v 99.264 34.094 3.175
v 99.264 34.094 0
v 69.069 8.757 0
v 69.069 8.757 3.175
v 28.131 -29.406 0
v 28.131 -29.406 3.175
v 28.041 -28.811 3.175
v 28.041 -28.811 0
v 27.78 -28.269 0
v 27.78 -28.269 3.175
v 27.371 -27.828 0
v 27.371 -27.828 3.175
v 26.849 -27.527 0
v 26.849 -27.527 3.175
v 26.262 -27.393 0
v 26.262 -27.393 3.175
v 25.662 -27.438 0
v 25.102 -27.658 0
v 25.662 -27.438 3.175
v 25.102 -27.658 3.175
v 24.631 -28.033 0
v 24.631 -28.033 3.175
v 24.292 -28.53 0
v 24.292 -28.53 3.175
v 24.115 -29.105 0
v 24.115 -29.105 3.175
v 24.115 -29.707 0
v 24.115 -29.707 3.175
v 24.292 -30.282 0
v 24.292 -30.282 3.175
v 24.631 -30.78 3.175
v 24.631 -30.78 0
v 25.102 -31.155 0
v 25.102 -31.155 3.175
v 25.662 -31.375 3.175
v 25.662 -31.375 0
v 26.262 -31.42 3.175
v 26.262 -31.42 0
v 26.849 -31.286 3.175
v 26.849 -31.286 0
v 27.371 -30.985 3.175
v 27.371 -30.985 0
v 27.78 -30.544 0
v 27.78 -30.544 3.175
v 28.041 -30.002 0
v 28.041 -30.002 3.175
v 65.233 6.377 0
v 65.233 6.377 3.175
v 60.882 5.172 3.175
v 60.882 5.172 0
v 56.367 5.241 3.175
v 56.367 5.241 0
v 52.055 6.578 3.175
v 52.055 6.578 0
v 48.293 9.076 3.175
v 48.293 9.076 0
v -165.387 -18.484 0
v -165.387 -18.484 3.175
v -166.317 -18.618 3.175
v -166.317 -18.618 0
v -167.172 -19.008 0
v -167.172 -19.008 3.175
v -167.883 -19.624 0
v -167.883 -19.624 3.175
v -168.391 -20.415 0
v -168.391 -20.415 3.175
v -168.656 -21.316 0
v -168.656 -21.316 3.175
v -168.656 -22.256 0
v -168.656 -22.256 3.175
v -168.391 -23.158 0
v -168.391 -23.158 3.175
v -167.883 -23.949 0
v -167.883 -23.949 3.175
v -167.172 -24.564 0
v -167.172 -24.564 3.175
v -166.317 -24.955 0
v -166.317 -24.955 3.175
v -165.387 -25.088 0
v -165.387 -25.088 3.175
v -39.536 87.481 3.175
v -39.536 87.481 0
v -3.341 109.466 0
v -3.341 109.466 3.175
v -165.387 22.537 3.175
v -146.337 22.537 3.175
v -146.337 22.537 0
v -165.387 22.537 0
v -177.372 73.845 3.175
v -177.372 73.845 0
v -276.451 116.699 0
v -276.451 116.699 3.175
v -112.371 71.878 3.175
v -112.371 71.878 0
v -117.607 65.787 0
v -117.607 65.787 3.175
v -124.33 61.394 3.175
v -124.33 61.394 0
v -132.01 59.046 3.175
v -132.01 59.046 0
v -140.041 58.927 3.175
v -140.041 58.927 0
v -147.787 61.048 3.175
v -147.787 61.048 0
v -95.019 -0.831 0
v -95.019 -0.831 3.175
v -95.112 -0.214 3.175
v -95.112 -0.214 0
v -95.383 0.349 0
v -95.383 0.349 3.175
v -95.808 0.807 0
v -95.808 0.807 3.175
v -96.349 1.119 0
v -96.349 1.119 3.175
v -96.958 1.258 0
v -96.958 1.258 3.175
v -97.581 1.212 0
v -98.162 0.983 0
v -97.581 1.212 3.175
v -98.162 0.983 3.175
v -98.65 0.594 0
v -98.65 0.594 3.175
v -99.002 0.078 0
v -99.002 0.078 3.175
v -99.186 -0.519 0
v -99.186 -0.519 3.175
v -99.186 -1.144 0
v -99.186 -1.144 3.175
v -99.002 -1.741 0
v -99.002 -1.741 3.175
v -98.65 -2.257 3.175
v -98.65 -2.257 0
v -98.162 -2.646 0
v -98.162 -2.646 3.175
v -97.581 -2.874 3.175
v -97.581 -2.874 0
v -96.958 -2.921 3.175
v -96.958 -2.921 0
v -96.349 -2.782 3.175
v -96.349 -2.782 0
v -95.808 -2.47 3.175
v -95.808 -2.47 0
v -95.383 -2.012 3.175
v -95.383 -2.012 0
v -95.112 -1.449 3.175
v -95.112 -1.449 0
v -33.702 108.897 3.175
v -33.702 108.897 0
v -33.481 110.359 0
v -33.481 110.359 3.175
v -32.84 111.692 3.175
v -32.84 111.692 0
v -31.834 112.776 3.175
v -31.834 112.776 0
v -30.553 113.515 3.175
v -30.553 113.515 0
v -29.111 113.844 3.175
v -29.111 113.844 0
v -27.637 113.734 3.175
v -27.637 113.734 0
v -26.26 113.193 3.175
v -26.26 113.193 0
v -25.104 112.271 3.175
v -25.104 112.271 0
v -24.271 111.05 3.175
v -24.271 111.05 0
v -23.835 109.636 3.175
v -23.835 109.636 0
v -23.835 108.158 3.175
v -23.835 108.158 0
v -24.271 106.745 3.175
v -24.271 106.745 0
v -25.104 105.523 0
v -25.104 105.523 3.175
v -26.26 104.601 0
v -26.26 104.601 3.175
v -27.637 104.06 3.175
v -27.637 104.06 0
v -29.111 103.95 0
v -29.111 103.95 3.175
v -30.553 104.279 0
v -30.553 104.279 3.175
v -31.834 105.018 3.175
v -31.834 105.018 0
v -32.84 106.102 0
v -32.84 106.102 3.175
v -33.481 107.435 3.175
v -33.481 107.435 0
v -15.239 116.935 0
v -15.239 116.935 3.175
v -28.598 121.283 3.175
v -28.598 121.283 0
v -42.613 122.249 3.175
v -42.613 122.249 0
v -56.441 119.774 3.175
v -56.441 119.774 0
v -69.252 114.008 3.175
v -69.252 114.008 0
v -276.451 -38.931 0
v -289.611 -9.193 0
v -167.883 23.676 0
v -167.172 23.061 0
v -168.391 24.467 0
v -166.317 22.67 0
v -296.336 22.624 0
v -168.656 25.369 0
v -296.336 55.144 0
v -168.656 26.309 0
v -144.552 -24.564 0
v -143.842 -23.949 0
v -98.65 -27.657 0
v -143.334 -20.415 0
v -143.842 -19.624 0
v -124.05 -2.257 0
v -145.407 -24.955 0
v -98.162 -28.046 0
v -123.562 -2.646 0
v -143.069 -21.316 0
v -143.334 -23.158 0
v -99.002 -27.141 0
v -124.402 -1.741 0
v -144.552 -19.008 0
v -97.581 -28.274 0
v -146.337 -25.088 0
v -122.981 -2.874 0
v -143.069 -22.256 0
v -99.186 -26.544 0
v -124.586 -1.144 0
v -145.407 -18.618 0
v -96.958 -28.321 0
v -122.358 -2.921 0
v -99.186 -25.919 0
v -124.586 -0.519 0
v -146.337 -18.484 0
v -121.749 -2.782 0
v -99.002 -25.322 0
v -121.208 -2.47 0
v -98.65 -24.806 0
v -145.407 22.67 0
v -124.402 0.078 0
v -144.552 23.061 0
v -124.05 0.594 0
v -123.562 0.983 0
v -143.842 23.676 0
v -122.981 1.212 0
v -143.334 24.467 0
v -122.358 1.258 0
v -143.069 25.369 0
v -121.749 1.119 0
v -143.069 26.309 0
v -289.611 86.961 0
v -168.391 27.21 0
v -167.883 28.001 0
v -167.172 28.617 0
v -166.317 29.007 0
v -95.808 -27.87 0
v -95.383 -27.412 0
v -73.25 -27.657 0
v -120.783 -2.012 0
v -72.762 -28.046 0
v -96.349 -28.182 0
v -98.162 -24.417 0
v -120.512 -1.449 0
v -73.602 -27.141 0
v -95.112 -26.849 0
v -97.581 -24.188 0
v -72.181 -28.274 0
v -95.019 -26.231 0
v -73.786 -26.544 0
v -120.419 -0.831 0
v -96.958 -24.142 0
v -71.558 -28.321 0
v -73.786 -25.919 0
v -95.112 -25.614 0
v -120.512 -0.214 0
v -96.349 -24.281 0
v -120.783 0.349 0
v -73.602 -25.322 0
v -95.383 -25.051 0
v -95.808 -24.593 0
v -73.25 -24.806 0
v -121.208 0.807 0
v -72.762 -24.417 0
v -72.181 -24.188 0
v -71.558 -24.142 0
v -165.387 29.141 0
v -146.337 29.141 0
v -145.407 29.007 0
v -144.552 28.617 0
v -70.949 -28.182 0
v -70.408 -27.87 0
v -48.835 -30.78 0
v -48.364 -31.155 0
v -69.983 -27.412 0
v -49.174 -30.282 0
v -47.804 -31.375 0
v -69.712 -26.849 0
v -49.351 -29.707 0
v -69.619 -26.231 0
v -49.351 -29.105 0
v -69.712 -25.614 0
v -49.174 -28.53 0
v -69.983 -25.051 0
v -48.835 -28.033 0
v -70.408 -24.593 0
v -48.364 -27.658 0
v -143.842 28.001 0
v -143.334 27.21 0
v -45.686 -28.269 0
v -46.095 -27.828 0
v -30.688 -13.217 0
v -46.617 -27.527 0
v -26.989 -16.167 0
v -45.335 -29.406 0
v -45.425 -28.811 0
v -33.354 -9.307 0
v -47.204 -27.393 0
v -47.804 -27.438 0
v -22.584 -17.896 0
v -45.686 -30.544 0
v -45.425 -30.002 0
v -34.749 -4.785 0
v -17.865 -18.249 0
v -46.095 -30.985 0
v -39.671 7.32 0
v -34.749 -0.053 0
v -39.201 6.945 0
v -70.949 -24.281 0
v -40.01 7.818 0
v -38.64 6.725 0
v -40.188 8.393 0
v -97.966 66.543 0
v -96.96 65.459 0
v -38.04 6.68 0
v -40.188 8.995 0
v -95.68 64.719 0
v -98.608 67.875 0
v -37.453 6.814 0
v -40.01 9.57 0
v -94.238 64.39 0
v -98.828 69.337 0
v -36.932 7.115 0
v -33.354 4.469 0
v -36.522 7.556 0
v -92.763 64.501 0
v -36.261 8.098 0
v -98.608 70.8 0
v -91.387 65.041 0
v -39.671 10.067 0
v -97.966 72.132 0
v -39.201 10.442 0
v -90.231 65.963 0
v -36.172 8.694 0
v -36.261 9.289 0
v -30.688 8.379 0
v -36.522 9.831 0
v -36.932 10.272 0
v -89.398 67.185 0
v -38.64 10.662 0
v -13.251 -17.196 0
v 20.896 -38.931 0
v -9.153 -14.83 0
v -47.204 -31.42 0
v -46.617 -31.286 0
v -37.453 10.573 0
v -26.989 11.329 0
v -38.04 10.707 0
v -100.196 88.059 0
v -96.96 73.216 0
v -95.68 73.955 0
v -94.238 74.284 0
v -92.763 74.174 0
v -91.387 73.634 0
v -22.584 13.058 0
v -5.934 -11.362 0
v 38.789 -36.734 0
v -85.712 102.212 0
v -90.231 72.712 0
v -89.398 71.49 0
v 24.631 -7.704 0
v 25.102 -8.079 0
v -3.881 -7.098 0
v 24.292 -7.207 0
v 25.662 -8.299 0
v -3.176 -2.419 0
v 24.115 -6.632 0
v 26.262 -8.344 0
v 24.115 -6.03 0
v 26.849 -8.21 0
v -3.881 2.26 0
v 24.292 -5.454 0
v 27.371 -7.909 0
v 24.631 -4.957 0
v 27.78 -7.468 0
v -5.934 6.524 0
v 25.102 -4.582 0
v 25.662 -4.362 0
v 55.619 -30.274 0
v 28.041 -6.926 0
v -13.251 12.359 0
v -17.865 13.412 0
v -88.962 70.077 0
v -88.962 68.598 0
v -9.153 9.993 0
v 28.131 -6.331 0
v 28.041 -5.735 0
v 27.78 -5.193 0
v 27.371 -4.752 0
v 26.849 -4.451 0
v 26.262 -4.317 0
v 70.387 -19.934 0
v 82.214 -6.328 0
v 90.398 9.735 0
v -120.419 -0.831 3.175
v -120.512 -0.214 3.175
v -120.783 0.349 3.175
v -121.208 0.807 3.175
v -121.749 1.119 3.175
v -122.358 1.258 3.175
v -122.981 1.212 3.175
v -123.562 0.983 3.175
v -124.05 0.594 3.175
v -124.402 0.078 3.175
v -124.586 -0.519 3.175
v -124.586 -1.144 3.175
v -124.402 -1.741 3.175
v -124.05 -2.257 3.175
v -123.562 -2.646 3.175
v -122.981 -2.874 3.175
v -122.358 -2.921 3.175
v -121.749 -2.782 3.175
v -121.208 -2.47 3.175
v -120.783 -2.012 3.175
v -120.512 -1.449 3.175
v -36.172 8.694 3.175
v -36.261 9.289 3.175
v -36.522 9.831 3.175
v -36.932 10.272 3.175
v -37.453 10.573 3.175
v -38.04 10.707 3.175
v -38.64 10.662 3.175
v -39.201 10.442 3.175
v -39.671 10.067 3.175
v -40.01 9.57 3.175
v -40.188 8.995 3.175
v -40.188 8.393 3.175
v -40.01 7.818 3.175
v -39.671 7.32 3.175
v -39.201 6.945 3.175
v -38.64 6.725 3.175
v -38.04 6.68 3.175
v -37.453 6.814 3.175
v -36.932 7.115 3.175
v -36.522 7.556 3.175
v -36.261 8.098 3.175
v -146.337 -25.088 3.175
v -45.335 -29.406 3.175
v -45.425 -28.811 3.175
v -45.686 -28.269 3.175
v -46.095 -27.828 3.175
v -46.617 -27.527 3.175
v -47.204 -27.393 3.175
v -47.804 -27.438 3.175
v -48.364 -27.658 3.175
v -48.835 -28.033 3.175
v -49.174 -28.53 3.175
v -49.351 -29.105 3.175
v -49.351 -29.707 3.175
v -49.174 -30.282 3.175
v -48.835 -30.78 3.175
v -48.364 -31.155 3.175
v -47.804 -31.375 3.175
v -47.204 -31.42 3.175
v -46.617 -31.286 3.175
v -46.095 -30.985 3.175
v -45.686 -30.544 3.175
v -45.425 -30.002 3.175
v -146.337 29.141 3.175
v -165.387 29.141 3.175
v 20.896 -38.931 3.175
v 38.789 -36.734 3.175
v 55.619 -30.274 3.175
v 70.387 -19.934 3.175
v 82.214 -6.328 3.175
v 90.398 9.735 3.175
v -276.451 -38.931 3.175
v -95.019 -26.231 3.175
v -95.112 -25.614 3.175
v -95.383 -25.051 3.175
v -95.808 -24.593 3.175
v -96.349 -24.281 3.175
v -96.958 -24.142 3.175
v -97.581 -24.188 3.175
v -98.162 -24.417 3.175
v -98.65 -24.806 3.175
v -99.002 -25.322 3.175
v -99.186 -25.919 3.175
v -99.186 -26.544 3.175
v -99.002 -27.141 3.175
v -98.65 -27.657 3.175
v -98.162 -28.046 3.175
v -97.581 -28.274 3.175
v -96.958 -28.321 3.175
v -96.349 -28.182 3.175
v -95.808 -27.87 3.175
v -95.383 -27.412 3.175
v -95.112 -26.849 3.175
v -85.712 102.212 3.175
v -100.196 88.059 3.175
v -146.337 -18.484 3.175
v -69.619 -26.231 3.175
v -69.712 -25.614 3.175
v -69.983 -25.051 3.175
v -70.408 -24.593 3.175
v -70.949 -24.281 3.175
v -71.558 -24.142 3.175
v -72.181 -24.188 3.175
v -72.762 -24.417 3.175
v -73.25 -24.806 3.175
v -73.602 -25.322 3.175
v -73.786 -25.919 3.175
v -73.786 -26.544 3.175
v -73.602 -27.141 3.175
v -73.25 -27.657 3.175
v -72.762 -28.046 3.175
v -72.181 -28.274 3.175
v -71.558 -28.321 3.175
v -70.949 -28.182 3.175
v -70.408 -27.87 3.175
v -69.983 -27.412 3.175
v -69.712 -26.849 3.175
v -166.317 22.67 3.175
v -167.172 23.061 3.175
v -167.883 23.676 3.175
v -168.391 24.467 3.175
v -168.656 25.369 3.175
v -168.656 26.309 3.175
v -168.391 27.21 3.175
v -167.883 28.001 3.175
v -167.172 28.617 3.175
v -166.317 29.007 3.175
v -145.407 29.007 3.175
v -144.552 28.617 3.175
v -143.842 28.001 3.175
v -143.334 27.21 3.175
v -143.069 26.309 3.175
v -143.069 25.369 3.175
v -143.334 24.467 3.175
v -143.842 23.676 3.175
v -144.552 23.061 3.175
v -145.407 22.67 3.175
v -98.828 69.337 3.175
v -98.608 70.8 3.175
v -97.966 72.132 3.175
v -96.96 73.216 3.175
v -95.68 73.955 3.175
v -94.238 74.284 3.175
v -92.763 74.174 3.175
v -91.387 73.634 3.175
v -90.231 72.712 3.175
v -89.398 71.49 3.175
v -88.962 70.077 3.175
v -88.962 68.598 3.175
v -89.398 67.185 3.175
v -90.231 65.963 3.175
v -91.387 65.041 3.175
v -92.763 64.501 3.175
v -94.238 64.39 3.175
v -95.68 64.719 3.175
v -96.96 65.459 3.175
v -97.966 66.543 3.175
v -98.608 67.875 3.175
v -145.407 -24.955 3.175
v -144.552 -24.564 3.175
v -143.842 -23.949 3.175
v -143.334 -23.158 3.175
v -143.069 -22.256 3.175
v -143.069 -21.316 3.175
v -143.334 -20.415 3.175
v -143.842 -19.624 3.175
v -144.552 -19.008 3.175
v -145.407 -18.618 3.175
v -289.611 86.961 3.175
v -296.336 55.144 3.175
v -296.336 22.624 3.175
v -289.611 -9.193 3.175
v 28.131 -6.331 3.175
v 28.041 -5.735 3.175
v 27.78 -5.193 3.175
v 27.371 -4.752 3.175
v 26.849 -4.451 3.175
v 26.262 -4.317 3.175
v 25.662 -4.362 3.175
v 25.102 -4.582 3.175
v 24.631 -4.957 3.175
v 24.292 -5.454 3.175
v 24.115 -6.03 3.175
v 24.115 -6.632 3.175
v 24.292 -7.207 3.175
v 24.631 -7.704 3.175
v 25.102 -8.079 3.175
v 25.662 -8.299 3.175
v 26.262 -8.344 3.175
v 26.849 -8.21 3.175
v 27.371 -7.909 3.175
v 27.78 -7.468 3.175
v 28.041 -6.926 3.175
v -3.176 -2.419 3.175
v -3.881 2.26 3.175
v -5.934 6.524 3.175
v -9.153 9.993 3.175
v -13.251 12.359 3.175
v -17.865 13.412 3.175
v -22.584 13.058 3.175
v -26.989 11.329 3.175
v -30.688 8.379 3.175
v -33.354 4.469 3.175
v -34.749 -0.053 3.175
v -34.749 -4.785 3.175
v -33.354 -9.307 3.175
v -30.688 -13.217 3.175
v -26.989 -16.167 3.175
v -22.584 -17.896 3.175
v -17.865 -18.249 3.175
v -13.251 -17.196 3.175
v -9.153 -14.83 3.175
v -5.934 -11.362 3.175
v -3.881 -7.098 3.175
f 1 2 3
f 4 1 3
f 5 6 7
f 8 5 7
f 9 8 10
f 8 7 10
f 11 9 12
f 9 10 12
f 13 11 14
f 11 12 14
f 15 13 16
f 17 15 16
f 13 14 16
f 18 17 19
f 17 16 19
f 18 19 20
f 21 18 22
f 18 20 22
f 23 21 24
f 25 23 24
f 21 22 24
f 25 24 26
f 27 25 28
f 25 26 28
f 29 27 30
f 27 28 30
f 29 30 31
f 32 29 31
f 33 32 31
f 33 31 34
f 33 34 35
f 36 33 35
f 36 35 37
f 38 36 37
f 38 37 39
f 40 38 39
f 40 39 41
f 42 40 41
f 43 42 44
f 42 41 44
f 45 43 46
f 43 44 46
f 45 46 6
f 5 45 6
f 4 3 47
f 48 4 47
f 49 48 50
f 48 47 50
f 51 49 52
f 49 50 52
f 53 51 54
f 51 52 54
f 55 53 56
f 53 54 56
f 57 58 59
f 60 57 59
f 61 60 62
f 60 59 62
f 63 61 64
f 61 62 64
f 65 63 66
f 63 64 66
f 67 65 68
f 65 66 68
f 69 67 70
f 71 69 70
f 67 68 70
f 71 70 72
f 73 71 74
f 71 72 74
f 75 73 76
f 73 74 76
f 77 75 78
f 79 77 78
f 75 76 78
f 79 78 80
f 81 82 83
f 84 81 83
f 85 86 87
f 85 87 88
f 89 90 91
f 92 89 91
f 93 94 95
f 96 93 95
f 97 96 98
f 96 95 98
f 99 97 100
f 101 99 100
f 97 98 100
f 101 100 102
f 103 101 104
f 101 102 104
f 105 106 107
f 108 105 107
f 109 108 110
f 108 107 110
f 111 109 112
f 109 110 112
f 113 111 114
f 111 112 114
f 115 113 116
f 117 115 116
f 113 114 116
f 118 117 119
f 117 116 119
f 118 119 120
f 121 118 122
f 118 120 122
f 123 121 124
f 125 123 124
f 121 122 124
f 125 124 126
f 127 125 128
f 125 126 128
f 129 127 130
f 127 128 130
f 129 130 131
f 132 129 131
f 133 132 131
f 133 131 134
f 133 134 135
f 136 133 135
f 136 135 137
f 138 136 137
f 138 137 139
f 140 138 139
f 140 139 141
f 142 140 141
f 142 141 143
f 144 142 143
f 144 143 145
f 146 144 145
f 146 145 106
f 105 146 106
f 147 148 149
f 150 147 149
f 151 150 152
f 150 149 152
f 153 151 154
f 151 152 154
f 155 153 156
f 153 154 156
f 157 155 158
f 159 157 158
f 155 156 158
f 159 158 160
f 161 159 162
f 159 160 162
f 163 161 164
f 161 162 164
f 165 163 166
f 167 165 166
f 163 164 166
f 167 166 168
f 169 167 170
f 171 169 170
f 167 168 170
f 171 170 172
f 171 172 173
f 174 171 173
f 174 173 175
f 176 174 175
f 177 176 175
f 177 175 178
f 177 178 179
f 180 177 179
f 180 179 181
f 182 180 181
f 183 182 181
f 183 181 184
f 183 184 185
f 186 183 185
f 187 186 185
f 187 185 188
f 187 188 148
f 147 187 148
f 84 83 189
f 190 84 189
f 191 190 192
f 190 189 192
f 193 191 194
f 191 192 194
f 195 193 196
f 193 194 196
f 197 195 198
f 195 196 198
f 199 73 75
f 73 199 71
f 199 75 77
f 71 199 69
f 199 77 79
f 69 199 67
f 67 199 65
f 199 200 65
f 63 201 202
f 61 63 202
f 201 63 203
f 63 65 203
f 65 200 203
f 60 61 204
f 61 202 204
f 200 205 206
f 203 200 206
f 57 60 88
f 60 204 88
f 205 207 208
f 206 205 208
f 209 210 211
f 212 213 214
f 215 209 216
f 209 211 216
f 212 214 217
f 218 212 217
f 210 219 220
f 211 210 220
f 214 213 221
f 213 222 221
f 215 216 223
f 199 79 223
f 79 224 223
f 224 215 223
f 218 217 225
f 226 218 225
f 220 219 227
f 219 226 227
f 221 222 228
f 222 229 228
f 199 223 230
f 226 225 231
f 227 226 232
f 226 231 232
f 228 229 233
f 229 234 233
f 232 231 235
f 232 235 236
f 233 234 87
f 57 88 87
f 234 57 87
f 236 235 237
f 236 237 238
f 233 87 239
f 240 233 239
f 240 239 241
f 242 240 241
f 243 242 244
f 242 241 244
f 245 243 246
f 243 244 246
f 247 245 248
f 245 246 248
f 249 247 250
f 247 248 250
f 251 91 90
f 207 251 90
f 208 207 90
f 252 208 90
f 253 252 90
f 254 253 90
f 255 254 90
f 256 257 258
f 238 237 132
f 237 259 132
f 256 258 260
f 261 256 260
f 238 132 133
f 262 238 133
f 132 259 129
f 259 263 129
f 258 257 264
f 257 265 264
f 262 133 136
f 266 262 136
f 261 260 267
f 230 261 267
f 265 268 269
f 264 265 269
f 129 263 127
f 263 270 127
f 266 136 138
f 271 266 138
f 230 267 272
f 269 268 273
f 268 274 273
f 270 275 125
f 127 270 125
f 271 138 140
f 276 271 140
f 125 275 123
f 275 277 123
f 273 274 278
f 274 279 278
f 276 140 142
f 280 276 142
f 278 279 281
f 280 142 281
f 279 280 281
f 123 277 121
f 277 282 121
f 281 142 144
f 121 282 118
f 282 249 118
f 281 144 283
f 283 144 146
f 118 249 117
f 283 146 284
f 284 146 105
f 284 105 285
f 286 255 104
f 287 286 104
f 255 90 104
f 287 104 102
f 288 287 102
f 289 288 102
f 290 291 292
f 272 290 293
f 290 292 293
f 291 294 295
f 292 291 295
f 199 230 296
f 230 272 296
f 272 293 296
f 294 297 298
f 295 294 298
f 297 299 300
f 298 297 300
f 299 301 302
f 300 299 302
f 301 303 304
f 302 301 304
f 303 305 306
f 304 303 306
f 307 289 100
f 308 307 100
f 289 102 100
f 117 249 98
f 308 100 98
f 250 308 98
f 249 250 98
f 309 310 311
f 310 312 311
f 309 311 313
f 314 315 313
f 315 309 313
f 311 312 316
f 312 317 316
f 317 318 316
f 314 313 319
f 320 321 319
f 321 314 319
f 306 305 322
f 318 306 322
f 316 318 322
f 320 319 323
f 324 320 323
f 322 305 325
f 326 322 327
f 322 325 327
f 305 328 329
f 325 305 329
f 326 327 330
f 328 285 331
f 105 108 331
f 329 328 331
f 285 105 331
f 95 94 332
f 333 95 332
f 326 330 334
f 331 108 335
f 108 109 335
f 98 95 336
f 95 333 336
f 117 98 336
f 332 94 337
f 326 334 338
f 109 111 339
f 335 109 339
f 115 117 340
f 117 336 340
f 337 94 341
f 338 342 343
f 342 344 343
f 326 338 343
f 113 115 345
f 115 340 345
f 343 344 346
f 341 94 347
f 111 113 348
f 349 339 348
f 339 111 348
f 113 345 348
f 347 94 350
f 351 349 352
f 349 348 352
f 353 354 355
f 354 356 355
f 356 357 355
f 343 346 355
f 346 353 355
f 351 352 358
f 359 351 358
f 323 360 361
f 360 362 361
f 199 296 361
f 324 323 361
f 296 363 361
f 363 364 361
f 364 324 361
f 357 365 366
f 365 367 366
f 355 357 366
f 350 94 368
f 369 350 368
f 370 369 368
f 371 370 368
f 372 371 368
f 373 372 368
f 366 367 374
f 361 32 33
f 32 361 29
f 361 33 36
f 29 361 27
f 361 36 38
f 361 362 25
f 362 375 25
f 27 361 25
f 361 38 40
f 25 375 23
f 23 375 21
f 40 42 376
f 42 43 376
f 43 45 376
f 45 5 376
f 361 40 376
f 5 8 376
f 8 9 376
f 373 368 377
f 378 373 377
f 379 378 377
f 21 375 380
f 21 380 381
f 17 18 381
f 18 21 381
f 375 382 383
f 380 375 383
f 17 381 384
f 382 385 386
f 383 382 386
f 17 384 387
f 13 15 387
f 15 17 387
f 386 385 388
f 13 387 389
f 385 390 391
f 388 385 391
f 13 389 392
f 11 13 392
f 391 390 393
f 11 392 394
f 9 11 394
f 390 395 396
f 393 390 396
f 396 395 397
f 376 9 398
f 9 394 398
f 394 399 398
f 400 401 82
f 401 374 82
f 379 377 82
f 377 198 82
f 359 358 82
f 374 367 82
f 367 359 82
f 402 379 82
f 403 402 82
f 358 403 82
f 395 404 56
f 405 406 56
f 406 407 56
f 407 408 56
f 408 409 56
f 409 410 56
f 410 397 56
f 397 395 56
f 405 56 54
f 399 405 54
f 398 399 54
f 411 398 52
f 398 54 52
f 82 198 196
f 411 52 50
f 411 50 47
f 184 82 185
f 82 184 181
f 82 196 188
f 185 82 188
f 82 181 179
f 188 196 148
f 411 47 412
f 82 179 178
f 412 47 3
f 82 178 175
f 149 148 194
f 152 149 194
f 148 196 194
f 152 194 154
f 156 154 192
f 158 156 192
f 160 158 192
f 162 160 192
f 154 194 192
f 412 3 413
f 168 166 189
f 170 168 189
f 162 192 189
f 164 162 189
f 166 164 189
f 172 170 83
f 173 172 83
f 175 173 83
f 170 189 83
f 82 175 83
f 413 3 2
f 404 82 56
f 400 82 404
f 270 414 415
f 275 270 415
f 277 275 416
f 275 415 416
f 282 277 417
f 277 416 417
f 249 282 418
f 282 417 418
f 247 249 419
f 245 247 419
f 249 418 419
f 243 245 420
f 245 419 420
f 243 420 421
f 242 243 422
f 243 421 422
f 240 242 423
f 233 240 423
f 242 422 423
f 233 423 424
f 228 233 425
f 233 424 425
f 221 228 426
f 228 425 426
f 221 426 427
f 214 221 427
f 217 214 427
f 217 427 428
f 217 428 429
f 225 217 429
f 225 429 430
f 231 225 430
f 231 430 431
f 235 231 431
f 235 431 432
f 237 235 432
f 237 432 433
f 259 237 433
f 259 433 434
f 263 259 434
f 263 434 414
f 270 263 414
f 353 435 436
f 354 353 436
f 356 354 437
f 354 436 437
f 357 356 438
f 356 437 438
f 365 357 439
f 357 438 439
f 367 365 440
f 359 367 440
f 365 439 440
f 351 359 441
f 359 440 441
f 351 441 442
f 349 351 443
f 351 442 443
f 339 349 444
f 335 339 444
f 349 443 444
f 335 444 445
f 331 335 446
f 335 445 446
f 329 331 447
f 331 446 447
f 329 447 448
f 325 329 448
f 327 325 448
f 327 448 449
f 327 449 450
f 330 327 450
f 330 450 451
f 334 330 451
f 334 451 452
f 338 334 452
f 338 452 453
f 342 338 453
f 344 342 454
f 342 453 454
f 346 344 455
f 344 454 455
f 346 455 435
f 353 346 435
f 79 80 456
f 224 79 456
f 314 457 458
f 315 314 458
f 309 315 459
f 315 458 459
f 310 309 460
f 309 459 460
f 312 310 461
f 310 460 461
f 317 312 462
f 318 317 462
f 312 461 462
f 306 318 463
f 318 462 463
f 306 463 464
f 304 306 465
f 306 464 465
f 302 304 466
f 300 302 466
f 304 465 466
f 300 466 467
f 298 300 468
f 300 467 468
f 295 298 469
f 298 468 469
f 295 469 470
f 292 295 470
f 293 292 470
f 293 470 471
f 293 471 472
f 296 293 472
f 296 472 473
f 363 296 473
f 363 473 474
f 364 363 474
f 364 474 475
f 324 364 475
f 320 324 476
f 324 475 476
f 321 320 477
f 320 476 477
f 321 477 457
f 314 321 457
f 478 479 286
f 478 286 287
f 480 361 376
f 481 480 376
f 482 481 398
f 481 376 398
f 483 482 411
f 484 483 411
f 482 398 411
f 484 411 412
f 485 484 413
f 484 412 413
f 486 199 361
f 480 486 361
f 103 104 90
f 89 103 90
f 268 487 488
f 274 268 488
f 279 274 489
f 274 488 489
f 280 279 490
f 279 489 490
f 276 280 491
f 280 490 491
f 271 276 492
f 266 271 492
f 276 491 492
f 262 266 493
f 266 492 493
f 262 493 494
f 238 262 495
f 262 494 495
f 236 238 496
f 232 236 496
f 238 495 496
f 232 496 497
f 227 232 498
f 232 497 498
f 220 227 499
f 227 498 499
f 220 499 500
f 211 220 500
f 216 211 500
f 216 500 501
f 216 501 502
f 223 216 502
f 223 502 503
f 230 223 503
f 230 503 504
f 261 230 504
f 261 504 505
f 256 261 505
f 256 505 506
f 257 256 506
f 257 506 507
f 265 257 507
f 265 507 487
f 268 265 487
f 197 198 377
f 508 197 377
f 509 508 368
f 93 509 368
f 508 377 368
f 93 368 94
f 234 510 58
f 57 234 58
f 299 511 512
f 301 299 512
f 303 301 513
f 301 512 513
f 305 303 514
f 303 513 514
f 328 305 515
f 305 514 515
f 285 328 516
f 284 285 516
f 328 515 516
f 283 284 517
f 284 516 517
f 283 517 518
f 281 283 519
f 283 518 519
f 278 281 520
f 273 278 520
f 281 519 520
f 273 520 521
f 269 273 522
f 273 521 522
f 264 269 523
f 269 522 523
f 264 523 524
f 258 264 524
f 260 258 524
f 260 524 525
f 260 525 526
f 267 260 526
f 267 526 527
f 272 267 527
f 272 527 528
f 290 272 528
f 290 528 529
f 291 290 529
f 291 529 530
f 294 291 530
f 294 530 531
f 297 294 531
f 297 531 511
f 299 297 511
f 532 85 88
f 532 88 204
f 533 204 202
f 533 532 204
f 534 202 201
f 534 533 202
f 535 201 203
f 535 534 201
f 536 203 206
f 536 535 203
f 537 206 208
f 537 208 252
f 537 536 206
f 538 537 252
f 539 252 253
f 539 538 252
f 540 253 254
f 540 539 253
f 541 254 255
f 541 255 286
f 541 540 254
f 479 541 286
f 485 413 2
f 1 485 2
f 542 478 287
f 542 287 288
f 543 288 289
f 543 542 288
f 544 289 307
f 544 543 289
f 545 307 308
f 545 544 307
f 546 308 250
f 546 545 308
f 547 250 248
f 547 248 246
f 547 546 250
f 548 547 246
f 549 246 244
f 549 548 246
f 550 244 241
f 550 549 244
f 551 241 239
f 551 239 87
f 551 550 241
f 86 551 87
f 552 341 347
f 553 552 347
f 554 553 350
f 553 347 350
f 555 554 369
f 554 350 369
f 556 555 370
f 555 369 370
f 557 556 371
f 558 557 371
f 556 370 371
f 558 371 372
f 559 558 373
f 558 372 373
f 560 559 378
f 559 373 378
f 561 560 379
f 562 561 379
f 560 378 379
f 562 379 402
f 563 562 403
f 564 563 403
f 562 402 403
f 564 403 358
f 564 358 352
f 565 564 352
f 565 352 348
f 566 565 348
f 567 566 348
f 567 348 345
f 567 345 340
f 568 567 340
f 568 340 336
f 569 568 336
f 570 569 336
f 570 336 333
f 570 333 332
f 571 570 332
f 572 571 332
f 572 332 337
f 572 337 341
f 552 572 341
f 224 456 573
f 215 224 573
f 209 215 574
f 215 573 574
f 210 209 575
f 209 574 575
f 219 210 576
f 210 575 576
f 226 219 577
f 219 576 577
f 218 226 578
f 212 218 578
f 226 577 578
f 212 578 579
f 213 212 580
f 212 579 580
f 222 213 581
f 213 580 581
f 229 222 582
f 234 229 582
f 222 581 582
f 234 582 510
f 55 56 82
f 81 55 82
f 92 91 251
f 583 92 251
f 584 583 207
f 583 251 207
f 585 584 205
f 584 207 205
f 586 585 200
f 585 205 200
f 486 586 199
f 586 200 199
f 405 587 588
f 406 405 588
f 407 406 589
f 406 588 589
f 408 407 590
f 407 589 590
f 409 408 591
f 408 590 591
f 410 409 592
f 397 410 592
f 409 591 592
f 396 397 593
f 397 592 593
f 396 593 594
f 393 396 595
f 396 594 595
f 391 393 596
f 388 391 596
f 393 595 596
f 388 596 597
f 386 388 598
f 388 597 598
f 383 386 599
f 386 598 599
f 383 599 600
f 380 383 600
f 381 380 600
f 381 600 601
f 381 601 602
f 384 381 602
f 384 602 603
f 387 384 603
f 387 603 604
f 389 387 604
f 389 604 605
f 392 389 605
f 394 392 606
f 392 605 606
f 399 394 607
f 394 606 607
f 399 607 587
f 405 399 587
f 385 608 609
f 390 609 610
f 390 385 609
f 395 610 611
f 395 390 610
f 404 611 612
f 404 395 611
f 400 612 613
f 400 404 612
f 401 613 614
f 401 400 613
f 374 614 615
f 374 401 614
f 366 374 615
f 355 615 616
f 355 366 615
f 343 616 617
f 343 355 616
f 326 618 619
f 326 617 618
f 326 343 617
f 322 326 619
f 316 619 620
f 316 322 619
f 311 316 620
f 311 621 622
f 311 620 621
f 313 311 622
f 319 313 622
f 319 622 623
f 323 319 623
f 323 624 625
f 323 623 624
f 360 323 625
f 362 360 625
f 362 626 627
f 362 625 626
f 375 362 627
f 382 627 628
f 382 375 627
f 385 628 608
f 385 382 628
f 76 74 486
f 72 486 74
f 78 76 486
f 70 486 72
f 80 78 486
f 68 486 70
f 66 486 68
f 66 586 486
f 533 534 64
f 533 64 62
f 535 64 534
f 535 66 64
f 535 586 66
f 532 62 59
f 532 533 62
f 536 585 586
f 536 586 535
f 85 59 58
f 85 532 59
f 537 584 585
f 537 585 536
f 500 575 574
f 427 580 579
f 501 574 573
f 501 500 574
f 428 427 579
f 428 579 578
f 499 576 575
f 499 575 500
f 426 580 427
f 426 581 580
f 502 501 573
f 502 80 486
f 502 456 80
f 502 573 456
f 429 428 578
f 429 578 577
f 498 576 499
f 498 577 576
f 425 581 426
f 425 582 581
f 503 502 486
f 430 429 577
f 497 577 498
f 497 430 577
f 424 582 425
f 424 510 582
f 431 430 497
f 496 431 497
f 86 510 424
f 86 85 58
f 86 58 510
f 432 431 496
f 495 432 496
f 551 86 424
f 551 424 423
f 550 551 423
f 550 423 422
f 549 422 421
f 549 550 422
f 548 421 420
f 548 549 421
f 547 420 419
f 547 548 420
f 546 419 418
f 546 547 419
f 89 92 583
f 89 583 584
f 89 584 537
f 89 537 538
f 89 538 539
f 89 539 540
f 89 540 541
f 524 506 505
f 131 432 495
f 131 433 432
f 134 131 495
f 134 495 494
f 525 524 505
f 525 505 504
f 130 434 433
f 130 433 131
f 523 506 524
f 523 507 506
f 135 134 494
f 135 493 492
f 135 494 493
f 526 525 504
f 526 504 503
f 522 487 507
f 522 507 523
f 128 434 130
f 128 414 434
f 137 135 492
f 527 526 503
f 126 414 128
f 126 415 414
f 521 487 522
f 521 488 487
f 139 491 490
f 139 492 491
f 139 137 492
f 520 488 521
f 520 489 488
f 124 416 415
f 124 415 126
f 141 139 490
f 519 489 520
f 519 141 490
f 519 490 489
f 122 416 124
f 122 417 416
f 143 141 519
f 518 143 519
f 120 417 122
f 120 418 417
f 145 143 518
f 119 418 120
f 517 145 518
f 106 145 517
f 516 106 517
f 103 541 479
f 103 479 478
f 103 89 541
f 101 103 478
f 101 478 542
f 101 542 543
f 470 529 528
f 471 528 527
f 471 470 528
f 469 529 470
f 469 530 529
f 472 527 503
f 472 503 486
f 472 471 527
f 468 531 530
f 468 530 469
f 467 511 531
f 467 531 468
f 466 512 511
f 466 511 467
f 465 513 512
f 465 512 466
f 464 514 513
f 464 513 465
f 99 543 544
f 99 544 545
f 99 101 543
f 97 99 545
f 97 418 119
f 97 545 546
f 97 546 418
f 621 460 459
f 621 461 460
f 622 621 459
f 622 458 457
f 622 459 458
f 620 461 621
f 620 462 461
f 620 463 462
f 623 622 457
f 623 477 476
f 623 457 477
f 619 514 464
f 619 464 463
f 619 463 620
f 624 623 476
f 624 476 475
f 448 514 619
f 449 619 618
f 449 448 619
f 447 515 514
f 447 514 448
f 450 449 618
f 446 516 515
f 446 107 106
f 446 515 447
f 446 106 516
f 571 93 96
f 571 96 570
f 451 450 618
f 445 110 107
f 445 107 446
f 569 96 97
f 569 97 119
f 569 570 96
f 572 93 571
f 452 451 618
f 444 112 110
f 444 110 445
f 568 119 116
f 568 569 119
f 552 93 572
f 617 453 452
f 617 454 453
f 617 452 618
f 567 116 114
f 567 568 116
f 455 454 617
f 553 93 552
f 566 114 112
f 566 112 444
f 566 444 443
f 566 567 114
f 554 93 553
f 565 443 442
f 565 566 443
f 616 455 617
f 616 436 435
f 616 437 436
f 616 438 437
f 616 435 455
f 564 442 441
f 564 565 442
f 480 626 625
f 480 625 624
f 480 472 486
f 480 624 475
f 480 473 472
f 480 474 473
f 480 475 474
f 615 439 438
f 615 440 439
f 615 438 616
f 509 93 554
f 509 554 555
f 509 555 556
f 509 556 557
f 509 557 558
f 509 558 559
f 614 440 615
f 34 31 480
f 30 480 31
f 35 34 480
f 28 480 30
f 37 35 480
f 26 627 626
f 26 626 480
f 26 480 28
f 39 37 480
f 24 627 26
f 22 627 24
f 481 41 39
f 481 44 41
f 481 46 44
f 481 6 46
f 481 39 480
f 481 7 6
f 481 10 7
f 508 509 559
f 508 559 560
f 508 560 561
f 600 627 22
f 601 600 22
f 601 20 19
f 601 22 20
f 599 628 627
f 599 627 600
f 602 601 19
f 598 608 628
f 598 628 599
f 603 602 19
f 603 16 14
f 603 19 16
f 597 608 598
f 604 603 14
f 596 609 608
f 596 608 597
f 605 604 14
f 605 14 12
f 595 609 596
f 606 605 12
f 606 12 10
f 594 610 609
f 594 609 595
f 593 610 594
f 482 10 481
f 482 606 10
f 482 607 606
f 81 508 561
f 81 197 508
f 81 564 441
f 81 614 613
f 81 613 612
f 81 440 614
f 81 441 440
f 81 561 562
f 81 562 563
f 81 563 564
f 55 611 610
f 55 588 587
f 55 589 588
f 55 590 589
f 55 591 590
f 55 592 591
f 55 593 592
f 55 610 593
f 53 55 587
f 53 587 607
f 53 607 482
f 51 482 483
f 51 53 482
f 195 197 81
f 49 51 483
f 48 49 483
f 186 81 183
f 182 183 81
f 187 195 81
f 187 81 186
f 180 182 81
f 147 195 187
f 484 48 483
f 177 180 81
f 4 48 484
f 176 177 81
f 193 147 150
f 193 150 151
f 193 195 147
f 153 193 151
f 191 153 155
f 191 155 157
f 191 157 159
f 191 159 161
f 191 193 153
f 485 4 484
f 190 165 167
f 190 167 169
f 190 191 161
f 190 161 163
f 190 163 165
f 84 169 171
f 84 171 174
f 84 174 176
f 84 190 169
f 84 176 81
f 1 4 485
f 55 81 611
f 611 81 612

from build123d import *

# Parameters (mm, degrees)
BOSS_EXTRUDE1_DEPTH              = 3.175
SKETCH4_R                        = 15.875
CUT_EXTRUDE1_DEPTH               = 4.175
SKETCH10_R                       = 2.0955
CUT_EXTRUDE5_DEPTH               = 4.175
CUT_EXTRUDE6_DEPTH               = 3.175
SKETCH12_R                       = 2.0193
CUT_EXTRUDE7_DEPTH               = 3.175
F_25_64_0_39063_DIAMETER_HOLE1_D = 9.922002


with BuildPart() as part:
    # Sketch1 → Boss-Extrude1 (new body)
    with BuildSketch(Plane.XY):
        with BuildLine():
            Line((-127.585439757, -38.931312956), (20.895912371, -38.931312956))
            ThreePointArc((20.895912371, -38.931312956), (63.319116371, -25.555328115), (90.398020935, 9.734587382))
            Line((90.398020935, 9.734587382), (99.264008145, 34.093687044))
            Line((99.264008145, 34.093687044), (69.069421488, 8.757420515))
            ThreePointArc((69.069421488, 8.757420515), (58.622007829, 5.045238426), (48.293203475, 9.075691085))
            Line((48.293203475, 9.075691085), (-39.53568268, 87.480536572))
            Line((-39.53568268, 87.480536572), (-3.340712695, 109.466412576))
            ThreePointArc((-3.340712695, 109.466412576), (-35.575547408, 122.196999074), (-69.251886775, 114.008191568))
            ThreePointArc((-69.251886775, 114.008191568), (-93.222829654, 95.410668155), (-112.371322471, 71.877517018))
            ThreePointArc((-112.371322471, 71.877517018), (-128.087342247, 59.948856215), (-147.787037557, 61.048051754))
            Line((-147.787037557, 61.048051754), (-177.372260989, 73.844569494))
            Line((-177.372260989, 73.844569494), (-276.451380272, 116.699331448))
            ThreePointArc((-276.451380272, 116.699331448), (-297.183919754, 38.884009246), (-276.451380272, -38.931312956))
            Line((-276.451380272, -38.931312956), (-127.585439757, -38.931312956))
        make_face()
    extrude(amount=BOSS_EXTRUDE1_DEPTH)

    # Sketch4 → Cut-Extrude1 (cut, through all)
    with BuildSketch(Plane.XY):
        with Locations((-19.051033526, -2.418812956)):
            Circle(SKETCH4_R)
    extrude(amount=CUT_EXTRUDE1_DEPTH, mode=Mode.SUBTRACT)

    # Sketch10 → Cut-Extrude5 (cut, through all)
    with BuildSketch(Plane.XY.offset(3.175)):
        with Locations((-97.11436, -26.231312956)):
            Circle(SKETCH10_R)
        with Locations((-71.71436, -26.231312956)):
            Circle(SKETCH10_R)
        with Locations((-122.51436, -0.831312956)):
            Circle(SKETCH10_R)
        with Locations((-97.11436, -0.831312956)):
            Circle(SKETCH10_R)
    extrude(amount=-CUT_EXTRUDE5_DEPTH, mode=Mode.SUBTRACT)

    # Sketch11 → Cut-Extrude6 (cut)
    with BuildSketch(Plane.XY.offset(3.175)):
        with BuildLine():
            Line((-165.387218926, -25.088312956), (-146.337218926, -25.088312956))
            ThreePointArc((-146.337218926, -25.088312956), (-143.035218926, -21.786312956), (-146.337218926, -18.484312956))
            Line((-146.337218926, -18.484312956), (-165.387218926, -18.484312956))
            ThreePointArc((-165.387218926, -18.484312956), (-168.689218926, -21.786312956), (-165.387218926, -25.088312956))
        make_face()
        with BuildLine():
            Line((-165.387218926, 29.140687044), (-146.337218926, 29.140687044))
            ThreePointArc((-146.337218926, 29.140687044), (-143.035218926, 25.838687044), (-146.337218926, 22.536687044))
            Line((-146.337218926, 22.536687044), (-165.387218926, 22.536687044))
            ThreePointArc((-165.387218926, 22.536687044), (-168.689218926, 25.838687044), (-165.387218926, 29.140687044))
        make_face()
    extrude(amount=-CUT_EXTRUDE6_DEPTH, mode=Mode.SUBTRACT)

    # Sketch12 → Cut-Extrude7 (cut)
    with BuildSketch(Plane.XY.offset(3.175)):
        with Locations((26.111583591, -6.330574271)):
            Circle(SKETCH12_R)
        with Locations((-38.190866701, 8.693687044)):
            Circle(SKETCH12_R)
        with Locations((-47.354412394, -29.406312956)):
            Circle(SKETCH12_R)
        with Locations((26.111583591, -29.406312956)):
            Circle(SKETCH12_R)
    extrude(amount=-CUT_EXTRUDE7_DEPTH, mode=Mode.SUBTRACT)

    # 25/64 (0.39063) Diameter Hole1 (through all)
    with Locations(Plane.XY.offset(3.175)):
        with Locations((-28.740712695, 108.89709501), (-93.867251666, 69.337343725)):
            Hole(F_25_64_0_39063_DIAMETER_HOLE1_D / 2)


solid = part.part
